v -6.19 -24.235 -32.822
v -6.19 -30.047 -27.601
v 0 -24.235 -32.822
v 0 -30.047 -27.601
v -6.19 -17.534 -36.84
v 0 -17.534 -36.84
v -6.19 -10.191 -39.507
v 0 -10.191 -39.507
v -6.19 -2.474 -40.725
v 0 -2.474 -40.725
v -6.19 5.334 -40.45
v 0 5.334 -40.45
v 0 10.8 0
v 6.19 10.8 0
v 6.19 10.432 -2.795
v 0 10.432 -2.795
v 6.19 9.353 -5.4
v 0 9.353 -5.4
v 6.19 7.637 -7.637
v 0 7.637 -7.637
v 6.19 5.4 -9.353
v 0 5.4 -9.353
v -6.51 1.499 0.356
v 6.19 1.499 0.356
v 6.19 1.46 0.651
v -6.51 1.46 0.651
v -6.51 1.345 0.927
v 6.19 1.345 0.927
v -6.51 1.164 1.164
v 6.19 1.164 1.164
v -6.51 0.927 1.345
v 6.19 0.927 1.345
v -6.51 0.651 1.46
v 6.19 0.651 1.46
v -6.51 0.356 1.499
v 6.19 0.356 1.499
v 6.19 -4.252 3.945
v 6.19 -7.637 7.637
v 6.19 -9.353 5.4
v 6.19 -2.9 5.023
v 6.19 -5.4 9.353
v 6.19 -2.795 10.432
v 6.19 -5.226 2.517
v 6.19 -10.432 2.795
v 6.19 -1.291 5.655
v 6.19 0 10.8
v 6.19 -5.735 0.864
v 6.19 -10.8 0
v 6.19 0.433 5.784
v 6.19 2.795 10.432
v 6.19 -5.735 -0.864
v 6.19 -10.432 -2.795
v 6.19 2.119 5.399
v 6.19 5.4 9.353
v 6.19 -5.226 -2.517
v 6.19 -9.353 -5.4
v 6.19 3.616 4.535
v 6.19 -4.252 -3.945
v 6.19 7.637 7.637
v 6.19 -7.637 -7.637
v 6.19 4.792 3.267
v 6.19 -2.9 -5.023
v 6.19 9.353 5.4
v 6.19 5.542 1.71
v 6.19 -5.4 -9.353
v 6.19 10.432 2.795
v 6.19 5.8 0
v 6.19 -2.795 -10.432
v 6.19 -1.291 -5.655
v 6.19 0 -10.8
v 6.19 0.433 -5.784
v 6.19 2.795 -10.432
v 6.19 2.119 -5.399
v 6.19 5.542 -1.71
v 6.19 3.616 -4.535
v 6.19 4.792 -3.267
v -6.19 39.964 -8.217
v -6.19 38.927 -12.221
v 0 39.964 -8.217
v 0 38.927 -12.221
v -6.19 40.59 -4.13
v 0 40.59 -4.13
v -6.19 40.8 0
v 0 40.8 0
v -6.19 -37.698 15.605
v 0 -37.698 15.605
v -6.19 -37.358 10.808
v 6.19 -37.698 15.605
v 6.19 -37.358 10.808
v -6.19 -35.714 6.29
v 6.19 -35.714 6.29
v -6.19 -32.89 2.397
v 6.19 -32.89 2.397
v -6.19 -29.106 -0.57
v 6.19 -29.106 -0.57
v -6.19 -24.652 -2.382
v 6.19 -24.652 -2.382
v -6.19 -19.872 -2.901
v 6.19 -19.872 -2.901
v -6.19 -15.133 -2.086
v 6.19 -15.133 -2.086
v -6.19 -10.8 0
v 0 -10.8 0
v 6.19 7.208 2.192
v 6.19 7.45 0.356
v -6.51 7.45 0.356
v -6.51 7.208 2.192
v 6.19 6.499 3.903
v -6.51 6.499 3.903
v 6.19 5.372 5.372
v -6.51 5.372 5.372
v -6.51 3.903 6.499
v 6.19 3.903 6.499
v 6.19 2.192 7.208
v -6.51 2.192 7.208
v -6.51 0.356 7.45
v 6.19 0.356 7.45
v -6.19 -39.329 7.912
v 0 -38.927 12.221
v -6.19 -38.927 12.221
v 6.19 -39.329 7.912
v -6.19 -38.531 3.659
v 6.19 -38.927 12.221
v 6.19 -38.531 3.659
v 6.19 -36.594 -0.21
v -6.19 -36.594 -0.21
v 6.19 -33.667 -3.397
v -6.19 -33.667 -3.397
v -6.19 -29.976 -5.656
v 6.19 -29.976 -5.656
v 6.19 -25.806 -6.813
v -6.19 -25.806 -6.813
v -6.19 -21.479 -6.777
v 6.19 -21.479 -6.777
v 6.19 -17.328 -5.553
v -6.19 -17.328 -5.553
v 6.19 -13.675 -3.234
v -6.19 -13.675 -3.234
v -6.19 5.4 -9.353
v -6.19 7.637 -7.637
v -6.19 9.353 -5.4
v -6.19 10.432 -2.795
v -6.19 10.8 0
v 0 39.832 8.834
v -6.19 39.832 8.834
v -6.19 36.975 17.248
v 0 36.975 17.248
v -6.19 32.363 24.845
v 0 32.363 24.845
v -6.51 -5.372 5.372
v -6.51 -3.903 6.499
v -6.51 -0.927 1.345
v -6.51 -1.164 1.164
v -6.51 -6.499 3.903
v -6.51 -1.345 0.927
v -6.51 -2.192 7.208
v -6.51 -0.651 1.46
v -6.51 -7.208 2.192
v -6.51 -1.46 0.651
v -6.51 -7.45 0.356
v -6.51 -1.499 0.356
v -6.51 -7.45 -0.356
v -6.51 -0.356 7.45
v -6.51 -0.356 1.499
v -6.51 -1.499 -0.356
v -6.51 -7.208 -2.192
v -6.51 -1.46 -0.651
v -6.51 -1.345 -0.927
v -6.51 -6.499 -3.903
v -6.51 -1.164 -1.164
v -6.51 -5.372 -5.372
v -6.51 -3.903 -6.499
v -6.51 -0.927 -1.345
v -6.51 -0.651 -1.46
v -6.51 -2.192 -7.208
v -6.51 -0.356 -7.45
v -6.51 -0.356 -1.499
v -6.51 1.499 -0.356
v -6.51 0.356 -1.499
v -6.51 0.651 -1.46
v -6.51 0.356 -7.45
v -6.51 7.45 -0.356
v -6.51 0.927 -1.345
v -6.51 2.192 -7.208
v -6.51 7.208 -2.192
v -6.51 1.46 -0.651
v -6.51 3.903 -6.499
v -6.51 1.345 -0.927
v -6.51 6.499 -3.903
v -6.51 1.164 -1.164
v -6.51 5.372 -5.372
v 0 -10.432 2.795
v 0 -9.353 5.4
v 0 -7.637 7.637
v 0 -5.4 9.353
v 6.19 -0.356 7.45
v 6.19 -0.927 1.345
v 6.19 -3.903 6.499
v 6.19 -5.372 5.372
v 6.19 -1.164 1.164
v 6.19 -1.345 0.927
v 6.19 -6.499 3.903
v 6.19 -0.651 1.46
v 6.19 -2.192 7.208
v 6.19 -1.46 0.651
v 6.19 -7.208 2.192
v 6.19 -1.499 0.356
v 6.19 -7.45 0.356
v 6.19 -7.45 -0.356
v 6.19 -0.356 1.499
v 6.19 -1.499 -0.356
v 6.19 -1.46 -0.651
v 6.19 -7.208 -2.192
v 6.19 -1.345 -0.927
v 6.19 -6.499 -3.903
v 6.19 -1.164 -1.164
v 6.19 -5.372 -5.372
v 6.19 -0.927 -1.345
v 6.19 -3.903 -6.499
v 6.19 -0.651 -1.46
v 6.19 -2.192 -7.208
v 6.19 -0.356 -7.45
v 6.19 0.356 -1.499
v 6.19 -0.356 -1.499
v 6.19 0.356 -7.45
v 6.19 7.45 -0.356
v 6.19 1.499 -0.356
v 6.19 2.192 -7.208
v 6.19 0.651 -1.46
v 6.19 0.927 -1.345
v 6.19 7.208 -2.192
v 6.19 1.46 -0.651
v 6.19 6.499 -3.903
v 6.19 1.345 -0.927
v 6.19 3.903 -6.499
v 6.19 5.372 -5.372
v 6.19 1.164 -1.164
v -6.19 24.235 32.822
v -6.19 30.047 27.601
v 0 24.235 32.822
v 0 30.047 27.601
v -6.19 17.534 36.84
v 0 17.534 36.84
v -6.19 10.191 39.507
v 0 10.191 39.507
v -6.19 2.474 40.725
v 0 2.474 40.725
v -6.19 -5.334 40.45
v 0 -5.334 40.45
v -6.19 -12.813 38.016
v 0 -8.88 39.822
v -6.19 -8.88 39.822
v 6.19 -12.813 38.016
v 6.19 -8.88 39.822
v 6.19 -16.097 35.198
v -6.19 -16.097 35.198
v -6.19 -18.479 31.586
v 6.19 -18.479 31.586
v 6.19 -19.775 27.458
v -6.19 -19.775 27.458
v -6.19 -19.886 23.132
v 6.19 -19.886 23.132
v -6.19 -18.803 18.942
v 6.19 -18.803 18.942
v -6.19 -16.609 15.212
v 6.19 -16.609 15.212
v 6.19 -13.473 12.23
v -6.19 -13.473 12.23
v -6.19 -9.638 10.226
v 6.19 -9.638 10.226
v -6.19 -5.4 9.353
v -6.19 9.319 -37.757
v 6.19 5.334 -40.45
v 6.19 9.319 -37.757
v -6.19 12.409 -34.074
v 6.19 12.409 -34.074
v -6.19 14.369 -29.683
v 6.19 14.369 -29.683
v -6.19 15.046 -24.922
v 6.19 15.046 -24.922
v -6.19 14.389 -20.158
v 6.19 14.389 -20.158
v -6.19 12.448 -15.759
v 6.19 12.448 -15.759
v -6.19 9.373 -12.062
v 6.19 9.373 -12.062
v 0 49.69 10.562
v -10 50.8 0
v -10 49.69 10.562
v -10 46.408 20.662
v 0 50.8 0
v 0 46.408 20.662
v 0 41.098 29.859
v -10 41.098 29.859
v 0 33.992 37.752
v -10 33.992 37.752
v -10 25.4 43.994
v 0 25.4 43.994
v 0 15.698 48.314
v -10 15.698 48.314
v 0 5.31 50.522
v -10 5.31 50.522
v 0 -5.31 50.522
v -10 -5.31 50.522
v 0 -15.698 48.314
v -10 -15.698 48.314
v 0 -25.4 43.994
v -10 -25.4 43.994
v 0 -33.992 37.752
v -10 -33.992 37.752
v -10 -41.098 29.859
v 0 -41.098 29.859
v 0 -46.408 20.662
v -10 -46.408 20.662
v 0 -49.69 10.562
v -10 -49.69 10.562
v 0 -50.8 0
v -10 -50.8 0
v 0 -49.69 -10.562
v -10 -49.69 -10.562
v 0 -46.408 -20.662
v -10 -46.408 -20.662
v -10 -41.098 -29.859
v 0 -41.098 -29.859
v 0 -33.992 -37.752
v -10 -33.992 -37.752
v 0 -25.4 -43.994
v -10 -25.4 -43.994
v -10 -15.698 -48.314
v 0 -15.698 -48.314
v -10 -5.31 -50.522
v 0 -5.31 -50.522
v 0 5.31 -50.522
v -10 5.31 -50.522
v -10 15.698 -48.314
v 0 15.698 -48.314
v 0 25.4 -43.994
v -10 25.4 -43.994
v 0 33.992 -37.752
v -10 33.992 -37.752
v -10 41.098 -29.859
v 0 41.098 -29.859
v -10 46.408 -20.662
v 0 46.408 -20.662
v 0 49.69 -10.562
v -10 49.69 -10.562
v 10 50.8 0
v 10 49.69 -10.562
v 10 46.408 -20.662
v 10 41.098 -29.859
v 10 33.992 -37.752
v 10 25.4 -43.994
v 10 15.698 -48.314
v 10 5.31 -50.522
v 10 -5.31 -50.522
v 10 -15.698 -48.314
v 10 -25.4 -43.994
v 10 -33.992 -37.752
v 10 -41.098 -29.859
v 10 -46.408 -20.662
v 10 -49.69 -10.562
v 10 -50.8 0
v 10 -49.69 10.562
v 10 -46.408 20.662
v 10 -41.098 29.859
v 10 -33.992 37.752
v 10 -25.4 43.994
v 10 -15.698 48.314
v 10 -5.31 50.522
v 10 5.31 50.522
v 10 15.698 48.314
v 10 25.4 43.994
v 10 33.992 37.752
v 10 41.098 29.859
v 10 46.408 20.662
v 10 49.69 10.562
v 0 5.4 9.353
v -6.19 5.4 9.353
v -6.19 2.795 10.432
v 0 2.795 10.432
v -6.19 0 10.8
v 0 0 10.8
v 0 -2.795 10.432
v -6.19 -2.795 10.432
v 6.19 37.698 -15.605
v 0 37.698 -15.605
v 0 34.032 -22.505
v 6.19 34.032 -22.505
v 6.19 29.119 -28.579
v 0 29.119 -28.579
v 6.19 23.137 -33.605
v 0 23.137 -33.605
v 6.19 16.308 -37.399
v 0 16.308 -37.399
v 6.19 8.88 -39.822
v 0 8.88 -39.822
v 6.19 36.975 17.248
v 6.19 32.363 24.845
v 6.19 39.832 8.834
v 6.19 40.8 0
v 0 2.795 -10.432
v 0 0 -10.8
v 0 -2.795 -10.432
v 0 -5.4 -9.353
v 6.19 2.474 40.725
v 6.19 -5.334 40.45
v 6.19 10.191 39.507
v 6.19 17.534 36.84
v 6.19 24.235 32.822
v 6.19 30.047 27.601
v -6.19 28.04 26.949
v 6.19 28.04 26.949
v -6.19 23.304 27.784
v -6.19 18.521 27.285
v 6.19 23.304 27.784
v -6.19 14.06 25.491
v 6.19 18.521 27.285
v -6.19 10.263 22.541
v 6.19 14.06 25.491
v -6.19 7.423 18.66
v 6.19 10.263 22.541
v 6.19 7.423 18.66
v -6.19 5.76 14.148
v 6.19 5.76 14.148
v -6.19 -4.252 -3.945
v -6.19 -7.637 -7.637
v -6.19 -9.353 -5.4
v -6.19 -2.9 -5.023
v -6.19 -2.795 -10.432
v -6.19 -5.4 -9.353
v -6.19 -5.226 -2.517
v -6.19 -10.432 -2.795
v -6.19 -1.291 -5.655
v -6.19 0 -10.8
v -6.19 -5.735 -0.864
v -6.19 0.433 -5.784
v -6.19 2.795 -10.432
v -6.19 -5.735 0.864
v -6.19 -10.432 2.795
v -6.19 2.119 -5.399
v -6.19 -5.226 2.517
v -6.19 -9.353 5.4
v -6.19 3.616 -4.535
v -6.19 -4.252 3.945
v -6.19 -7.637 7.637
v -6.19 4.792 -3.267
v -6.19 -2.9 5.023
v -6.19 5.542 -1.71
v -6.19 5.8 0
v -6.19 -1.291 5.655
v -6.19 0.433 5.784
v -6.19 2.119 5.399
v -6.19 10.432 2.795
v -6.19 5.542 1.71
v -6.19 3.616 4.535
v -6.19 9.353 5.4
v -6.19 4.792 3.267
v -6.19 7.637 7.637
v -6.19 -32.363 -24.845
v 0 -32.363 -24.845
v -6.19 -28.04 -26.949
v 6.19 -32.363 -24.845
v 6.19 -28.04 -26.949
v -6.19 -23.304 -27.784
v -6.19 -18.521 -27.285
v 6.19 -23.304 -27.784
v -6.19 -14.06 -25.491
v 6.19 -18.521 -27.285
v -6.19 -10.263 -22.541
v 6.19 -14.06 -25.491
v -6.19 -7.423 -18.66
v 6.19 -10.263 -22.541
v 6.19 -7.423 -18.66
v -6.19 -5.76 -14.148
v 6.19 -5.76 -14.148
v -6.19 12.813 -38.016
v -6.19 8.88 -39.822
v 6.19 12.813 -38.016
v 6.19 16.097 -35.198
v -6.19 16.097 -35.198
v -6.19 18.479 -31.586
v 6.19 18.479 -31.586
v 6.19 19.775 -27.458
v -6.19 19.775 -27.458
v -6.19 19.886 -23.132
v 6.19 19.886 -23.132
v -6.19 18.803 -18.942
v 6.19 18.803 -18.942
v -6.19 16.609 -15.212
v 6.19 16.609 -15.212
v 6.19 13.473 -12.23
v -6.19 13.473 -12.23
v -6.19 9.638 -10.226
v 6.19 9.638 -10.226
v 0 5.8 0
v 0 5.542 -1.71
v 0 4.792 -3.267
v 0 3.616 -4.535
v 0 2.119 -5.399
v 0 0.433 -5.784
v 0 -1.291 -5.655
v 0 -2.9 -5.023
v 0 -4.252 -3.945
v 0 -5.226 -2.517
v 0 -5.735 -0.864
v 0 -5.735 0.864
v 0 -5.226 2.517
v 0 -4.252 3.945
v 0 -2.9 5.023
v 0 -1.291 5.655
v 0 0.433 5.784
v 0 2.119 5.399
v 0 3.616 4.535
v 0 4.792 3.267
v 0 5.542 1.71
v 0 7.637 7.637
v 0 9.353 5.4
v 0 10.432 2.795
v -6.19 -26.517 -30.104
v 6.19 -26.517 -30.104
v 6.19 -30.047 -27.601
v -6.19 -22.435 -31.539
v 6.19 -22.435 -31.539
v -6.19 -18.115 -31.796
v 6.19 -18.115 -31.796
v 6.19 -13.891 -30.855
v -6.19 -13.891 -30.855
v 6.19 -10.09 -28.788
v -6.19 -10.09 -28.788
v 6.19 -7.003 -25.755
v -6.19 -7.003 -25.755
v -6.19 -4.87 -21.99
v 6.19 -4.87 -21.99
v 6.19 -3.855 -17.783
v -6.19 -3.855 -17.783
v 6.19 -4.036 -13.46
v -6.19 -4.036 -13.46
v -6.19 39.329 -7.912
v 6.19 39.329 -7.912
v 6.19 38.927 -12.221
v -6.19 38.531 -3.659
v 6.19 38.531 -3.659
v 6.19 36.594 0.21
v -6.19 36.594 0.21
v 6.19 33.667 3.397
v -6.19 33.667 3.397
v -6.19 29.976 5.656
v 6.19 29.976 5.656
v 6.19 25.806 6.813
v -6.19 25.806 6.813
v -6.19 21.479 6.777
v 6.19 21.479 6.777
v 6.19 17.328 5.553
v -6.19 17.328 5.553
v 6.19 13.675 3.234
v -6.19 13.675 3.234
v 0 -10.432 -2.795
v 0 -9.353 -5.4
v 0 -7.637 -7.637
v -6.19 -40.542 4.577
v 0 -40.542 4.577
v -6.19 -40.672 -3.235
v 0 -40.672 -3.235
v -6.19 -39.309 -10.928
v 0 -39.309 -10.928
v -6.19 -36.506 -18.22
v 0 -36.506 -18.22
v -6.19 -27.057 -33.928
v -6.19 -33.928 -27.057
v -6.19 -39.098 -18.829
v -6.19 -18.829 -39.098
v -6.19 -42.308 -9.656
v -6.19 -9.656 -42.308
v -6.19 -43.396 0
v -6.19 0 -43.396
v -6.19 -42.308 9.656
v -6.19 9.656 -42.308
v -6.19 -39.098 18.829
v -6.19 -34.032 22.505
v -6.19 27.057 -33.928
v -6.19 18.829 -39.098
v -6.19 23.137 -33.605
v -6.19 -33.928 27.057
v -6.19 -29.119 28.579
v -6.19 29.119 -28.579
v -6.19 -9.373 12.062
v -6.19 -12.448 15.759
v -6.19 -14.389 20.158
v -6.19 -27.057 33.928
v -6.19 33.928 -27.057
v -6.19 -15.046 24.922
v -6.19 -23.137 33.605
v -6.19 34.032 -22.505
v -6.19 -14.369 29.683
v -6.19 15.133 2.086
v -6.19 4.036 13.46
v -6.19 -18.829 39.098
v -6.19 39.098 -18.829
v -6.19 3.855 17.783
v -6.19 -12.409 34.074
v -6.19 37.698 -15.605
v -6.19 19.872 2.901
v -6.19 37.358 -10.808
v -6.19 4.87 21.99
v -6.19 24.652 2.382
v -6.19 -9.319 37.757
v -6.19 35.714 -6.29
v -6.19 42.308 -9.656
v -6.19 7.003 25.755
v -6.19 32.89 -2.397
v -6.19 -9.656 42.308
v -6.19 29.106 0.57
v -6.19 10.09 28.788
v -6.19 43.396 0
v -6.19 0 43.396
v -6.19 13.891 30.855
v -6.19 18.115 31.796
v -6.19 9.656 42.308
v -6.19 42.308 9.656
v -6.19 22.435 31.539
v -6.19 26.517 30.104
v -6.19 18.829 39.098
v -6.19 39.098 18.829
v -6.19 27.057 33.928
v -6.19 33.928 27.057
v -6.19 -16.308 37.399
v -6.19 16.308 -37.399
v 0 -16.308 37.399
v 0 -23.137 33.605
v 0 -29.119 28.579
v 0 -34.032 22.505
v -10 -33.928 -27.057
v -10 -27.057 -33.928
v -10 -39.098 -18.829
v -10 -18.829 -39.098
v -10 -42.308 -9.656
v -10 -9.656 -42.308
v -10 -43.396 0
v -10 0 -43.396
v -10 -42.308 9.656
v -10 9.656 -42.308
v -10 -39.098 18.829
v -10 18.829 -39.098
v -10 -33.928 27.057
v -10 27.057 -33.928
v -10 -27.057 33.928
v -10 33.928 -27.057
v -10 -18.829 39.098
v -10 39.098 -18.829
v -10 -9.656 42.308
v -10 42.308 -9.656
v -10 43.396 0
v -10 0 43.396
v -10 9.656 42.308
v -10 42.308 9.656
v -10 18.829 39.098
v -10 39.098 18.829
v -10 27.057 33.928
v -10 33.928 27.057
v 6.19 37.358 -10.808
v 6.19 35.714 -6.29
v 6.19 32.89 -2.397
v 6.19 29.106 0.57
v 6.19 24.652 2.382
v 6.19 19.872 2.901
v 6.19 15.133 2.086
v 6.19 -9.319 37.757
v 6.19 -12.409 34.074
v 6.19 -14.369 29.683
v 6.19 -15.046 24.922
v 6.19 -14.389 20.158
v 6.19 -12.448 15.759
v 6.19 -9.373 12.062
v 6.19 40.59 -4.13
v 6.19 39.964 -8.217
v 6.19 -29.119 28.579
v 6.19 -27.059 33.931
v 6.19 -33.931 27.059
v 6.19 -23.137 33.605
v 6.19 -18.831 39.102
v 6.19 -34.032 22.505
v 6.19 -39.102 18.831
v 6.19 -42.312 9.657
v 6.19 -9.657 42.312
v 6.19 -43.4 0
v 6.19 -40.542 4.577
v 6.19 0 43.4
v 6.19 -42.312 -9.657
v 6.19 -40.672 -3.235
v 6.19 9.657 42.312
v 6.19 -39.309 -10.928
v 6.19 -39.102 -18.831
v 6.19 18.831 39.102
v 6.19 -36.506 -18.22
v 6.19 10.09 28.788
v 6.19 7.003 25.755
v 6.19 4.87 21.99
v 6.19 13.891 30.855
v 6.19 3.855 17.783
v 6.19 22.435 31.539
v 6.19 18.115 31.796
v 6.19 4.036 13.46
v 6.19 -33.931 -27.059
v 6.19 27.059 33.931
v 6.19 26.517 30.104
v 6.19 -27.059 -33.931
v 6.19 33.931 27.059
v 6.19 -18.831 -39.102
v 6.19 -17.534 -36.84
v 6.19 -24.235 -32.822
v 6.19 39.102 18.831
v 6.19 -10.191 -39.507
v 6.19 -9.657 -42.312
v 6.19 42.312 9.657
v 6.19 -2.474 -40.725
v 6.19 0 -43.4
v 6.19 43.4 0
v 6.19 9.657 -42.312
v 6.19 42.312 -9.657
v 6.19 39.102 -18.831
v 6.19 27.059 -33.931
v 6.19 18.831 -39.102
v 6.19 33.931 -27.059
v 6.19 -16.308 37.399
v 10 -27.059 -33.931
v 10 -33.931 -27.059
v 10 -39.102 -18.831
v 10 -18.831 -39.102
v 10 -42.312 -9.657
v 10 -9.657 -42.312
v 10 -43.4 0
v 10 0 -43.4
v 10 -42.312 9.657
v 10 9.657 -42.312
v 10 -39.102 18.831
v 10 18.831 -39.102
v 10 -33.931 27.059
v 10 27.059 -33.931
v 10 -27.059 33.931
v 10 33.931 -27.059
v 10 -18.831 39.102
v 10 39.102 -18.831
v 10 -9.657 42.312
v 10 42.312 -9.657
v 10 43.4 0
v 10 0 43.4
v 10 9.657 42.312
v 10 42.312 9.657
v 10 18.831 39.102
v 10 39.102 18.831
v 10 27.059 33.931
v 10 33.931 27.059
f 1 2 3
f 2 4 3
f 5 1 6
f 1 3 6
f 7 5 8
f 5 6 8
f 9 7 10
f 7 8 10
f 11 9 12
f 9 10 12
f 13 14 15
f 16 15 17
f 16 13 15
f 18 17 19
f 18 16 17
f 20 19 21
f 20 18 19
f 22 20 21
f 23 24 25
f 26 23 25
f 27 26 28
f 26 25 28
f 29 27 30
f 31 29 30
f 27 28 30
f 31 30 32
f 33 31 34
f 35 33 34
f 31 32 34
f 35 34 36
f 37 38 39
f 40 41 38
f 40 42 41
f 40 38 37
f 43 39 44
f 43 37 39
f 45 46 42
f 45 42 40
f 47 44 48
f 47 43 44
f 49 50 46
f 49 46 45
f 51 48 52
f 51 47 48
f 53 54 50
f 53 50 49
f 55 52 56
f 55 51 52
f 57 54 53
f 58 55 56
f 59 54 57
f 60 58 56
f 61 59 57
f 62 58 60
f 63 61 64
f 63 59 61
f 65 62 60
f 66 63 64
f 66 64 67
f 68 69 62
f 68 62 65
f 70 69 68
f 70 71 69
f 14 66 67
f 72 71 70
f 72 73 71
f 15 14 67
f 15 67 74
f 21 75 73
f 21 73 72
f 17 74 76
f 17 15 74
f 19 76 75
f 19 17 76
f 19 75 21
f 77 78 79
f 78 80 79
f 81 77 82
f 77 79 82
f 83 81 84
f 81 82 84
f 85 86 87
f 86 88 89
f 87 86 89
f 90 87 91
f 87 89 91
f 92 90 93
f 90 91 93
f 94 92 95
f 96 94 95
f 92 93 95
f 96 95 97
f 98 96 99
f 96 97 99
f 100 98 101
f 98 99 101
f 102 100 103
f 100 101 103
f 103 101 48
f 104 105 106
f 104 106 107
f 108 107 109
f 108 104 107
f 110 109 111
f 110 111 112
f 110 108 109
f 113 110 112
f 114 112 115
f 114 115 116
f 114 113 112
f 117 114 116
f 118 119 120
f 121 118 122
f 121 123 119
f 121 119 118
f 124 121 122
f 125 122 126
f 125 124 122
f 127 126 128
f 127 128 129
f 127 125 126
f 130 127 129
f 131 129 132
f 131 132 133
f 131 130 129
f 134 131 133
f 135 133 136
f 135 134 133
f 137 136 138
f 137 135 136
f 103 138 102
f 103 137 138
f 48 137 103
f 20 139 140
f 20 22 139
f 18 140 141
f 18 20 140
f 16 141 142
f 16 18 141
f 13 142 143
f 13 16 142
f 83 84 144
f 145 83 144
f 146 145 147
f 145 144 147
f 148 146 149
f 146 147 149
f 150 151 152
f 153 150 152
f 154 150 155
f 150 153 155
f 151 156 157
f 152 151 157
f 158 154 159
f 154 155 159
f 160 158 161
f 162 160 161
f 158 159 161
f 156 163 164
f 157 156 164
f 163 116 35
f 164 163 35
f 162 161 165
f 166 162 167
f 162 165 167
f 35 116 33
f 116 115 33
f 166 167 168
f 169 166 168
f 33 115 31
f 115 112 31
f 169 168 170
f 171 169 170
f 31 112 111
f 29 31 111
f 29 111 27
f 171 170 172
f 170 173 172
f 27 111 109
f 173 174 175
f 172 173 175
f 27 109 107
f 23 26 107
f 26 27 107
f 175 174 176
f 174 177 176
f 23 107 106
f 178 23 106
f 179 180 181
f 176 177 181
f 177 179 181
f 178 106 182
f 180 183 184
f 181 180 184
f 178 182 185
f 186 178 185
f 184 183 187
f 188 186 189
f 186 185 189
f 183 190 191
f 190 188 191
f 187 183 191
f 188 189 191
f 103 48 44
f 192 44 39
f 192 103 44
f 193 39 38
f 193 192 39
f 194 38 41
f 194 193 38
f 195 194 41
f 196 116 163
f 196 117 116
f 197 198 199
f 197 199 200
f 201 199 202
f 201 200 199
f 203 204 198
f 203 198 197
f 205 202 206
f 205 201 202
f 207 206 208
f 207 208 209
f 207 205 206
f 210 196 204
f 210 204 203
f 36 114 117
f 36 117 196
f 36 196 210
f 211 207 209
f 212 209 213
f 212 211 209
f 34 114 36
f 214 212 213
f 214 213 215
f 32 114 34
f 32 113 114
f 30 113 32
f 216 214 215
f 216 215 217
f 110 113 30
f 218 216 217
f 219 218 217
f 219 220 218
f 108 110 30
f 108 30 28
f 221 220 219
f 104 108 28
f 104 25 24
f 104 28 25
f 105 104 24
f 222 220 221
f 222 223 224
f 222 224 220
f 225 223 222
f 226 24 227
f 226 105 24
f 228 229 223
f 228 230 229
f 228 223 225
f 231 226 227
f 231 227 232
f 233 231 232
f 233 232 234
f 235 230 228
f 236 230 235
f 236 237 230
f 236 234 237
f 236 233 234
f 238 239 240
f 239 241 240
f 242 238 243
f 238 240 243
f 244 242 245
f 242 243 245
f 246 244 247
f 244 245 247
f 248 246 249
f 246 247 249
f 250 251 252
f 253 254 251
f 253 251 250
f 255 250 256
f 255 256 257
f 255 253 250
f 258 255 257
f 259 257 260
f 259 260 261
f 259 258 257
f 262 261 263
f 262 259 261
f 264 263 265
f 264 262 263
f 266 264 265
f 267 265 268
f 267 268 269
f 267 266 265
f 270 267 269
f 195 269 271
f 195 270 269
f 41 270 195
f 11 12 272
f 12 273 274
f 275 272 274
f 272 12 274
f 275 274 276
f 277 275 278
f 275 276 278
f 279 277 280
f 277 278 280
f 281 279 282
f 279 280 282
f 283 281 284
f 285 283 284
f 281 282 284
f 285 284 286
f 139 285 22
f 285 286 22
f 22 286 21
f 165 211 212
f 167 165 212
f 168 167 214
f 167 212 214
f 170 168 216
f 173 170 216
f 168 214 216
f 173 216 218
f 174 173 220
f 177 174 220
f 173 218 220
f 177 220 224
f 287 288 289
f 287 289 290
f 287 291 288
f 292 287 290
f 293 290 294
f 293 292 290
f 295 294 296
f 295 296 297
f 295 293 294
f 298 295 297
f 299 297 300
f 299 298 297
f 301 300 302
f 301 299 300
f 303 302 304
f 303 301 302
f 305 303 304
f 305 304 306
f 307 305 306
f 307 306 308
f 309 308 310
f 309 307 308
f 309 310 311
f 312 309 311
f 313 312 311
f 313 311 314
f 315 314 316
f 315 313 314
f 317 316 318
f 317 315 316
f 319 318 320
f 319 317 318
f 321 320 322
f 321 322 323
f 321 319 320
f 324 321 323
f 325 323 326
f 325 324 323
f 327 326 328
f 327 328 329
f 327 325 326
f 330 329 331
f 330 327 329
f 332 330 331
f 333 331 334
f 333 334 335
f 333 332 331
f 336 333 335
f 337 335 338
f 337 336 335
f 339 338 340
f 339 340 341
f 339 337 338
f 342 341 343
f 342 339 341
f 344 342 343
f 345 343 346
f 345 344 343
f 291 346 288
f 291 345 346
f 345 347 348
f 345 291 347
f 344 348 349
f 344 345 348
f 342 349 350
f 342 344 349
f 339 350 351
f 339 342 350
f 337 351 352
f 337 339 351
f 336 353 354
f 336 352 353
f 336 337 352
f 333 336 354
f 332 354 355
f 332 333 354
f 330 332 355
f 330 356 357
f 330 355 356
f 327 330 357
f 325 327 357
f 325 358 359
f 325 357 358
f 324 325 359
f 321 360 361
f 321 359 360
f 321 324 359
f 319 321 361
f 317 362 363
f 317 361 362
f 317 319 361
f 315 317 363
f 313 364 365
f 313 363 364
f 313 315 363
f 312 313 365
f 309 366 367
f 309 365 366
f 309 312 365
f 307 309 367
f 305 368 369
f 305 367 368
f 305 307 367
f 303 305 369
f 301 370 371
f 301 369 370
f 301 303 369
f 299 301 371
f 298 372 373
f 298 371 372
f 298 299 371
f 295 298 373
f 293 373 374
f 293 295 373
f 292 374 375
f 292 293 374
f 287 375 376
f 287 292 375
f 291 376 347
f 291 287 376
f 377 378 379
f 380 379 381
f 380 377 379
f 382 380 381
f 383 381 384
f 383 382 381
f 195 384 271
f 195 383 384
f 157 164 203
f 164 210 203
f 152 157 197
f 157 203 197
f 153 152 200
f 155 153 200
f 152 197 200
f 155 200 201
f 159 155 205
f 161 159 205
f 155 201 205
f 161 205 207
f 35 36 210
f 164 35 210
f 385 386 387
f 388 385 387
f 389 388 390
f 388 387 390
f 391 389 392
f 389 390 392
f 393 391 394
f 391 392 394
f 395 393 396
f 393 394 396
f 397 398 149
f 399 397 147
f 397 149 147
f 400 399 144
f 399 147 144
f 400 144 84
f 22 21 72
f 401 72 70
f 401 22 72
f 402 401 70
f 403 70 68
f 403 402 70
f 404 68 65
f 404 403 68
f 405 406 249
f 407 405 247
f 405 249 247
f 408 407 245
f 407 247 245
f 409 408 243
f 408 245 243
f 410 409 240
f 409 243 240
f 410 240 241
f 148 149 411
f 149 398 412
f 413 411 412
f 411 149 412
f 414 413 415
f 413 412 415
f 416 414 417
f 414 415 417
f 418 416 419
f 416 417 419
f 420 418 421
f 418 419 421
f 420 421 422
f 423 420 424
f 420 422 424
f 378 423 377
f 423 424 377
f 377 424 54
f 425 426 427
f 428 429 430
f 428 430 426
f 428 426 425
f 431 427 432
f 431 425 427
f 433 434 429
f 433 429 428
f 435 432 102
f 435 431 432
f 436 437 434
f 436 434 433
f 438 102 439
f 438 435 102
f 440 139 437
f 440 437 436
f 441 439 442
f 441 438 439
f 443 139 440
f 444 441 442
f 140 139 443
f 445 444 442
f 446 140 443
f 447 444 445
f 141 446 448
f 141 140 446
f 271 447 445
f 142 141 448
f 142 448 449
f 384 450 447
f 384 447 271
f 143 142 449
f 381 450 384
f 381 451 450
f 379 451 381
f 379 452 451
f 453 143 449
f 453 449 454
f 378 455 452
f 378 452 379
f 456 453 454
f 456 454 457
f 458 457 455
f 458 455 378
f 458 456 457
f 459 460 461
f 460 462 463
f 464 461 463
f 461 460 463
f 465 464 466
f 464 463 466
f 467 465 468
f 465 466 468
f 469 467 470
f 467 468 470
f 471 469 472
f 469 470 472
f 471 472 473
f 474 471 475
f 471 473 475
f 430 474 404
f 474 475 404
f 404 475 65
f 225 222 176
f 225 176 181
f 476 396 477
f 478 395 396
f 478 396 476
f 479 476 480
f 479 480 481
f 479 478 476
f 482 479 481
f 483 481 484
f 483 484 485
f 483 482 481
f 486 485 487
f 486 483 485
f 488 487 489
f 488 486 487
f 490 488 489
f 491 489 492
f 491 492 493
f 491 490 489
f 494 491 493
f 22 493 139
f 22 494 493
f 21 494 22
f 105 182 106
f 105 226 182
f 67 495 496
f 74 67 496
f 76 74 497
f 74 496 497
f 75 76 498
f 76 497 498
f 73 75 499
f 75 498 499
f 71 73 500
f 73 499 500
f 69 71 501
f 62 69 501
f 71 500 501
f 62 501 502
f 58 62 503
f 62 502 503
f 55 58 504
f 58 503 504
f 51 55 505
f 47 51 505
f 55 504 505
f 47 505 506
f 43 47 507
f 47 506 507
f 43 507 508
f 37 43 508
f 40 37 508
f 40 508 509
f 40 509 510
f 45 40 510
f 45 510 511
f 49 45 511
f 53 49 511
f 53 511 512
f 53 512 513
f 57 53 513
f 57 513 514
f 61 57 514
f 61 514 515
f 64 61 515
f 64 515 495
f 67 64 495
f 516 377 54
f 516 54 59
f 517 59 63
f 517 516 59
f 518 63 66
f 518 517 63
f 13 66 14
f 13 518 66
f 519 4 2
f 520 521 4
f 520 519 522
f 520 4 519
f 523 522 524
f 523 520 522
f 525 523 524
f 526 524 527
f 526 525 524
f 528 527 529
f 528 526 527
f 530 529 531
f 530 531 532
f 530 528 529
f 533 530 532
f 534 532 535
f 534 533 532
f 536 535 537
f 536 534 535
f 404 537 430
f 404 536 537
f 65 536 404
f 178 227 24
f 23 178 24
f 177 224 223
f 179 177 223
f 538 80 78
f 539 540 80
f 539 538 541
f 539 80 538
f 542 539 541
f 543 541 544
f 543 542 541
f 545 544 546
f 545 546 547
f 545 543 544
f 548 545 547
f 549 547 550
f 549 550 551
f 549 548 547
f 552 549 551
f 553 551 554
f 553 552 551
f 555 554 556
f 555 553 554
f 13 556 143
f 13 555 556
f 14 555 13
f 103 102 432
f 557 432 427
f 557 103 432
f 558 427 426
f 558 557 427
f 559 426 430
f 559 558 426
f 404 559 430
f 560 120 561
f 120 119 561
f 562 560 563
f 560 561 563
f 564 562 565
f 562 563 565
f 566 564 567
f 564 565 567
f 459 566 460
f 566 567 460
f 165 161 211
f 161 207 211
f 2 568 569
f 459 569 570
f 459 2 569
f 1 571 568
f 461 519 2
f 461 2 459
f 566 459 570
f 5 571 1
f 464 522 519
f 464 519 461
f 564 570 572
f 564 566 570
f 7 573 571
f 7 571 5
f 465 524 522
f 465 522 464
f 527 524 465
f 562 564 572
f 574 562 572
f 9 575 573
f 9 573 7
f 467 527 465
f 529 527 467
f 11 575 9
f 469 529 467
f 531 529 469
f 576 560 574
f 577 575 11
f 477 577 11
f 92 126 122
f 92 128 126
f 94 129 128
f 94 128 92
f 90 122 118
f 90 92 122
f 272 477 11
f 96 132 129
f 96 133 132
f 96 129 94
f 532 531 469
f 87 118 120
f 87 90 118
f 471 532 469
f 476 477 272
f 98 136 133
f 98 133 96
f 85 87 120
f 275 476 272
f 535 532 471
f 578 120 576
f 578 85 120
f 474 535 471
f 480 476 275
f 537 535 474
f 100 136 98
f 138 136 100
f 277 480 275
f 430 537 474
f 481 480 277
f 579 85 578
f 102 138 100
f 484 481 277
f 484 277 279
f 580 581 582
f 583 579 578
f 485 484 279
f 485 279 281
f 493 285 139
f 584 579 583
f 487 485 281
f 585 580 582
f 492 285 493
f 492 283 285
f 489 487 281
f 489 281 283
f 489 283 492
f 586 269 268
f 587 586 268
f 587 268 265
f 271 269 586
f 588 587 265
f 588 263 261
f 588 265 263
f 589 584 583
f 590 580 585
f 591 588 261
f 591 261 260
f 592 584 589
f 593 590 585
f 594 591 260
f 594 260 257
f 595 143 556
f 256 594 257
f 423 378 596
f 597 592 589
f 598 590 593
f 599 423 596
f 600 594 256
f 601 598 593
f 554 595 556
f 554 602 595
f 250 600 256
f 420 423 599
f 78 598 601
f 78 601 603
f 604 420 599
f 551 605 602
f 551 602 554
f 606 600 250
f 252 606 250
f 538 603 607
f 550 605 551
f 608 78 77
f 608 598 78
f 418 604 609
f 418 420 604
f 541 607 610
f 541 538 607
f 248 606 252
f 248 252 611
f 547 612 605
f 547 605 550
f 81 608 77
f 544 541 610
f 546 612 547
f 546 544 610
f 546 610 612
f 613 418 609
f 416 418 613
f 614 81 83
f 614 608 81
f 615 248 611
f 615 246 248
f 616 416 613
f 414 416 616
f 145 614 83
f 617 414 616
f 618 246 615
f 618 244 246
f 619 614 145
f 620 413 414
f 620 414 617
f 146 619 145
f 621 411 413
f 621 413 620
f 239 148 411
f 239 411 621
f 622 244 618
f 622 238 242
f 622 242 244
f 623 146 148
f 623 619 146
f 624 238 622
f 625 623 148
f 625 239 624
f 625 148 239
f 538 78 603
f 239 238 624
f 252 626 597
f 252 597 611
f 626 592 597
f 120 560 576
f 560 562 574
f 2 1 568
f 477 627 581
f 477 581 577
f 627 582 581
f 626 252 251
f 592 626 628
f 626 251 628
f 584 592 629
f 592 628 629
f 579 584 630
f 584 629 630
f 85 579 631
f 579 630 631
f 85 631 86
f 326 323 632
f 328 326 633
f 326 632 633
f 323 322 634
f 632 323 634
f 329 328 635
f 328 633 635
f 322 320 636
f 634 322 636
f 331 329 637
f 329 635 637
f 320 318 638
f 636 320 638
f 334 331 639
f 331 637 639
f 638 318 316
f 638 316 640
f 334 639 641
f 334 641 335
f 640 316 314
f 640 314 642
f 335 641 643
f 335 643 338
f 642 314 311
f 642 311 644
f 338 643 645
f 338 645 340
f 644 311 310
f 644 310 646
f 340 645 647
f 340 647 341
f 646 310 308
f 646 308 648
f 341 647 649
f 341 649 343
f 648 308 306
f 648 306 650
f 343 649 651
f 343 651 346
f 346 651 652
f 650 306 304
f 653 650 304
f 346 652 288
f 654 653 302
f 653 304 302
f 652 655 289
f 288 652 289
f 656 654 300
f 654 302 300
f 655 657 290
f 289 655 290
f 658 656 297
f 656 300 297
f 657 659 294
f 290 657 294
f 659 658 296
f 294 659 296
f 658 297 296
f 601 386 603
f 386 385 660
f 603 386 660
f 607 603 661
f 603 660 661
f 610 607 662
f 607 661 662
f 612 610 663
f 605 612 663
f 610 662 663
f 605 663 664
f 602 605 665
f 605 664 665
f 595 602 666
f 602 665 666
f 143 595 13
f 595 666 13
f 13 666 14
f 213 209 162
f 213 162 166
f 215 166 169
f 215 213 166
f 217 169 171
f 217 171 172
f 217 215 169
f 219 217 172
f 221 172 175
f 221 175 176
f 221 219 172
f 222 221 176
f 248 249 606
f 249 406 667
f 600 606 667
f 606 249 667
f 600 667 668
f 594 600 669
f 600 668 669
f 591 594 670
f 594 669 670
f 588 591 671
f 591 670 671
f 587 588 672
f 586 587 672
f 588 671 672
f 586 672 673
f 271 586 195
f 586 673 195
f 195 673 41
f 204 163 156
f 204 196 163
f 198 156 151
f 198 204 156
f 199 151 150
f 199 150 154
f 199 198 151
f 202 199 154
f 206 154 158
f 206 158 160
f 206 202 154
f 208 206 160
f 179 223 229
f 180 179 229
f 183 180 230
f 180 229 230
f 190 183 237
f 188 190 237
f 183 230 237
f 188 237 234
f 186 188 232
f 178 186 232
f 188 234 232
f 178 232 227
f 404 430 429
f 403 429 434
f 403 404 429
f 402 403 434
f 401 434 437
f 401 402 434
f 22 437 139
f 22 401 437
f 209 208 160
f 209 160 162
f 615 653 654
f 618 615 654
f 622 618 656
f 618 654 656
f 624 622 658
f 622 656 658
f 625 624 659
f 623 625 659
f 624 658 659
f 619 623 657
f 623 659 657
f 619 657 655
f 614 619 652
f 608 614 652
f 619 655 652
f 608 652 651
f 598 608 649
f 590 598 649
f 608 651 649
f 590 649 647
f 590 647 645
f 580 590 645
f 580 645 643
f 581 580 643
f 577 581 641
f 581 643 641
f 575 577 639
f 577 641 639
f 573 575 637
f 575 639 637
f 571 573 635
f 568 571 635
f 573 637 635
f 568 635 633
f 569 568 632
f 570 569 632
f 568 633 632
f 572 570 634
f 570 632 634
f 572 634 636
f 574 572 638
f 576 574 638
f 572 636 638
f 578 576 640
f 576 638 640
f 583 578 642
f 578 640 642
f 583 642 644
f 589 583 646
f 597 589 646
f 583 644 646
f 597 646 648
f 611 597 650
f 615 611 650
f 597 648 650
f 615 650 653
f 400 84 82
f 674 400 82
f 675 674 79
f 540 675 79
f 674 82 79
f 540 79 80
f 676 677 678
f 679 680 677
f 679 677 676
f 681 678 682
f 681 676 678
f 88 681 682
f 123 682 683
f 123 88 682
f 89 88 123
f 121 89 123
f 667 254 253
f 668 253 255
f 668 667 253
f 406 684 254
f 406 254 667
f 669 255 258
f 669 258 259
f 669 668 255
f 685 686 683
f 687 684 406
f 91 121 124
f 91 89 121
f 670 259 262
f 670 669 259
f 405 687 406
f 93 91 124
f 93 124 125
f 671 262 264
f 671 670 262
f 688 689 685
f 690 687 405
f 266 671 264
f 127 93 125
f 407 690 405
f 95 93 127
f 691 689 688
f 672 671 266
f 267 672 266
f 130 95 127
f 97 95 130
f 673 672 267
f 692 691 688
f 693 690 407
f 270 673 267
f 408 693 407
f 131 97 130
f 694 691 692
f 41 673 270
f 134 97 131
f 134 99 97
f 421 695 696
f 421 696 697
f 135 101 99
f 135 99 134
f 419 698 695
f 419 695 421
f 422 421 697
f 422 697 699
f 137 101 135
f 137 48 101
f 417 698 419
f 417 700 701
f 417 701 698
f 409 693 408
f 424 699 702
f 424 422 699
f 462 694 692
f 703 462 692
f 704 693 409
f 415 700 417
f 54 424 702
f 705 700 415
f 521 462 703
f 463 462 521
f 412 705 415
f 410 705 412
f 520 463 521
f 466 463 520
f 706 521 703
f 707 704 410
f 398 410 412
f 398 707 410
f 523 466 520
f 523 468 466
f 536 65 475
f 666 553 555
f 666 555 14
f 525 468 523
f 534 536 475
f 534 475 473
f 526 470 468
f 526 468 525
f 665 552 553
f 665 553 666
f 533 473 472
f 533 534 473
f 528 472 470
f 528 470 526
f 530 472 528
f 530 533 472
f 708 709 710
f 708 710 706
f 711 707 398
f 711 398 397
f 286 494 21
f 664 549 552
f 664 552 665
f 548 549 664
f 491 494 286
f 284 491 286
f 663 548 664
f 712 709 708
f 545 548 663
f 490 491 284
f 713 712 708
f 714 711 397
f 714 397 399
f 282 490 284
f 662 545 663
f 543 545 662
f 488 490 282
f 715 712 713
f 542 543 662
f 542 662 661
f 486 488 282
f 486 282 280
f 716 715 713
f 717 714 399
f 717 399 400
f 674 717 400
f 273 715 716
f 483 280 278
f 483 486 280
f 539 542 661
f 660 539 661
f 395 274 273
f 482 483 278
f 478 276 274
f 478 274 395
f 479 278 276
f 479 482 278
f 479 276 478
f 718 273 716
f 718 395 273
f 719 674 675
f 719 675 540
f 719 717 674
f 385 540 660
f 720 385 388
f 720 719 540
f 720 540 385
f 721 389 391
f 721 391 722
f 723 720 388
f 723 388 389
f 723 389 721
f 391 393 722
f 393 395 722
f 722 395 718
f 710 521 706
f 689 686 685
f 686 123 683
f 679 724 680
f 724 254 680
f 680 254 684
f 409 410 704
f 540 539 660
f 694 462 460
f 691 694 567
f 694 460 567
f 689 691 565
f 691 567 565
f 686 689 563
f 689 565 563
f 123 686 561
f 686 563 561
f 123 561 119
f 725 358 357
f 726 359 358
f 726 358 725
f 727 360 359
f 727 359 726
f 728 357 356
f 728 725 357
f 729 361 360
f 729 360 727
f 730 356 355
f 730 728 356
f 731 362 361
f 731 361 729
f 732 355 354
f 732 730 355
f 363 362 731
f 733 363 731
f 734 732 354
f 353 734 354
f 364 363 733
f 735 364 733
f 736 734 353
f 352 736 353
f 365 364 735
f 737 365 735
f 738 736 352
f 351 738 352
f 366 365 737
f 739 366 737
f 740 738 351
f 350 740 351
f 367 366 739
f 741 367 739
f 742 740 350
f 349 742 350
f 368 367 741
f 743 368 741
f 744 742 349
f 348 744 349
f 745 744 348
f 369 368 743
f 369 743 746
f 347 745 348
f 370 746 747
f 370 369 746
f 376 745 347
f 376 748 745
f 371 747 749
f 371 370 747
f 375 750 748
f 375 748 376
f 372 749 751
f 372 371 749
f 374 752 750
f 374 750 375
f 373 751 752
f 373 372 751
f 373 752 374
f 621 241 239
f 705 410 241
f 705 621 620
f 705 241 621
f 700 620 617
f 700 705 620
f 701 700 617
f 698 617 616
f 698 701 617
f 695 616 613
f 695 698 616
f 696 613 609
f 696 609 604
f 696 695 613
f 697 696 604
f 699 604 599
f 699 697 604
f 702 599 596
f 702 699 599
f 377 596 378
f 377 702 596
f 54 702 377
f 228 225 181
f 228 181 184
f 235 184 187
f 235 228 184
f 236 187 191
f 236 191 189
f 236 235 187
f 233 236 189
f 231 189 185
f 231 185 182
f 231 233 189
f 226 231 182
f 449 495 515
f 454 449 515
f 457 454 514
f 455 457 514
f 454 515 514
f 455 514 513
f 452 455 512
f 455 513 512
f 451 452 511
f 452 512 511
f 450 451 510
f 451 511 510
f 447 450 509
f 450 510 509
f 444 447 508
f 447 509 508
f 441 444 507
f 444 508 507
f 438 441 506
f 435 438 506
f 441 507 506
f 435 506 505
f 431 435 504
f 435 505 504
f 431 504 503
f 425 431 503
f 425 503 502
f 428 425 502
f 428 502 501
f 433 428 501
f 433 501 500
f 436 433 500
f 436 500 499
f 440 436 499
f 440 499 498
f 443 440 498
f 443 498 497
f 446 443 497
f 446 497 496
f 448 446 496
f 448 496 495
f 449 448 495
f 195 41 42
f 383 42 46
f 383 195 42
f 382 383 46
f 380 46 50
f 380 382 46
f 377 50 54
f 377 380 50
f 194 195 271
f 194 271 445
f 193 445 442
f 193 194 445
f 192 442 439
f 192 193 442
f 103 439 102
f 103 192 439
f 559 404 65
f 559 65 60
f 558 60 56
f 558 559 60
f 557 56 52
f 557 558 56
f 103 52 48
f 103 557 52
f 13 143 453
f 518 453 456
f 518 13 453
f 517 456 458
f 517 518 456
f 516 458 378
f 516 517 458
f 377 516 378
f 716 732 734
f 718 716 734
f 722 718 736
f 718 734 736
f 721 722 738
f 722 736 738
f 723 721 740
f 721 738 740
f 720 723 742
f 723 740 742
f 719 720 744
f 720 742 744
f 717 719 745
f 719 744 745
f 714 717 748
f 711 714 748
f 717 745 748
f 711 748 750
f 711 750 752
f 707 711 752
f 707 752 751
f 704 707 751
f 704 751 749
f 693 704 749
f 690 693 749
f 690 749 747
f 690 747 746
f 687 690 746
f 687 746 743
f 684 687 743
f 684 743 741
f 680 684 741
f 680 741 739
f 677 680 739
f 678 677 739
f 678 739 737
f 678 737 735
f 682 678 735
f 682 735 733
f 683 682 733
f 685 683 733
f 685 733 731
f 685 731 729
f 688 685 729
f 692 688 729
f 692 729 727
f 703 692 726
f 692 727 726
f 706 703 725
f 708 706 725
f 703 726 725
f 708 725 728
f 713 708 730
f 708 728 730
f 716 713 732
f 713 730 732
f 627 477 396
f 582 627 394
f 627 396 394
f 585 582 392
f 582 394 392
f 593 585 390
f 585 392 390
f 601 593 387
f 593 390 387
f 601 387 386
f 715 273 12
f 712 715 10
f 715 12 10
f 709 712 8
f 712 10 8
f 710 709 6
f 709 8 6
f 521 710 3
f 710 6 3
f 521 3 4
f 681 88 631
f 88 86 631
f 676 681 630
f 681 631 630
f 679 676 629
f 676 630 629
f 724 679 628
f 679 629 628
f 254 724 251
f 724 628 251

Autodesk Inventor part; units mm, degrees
ref_plane "YZ Plane" through (0, 0, 0) normal (1, 0, 0) x (0, 1, 0)
ref_plane "XZ Plane" through (0, 0, 0) normal (0, 1, 0) x (-1, 0, 0)
ref_plane "XY Plane" through (0, 0, 0) normal (0, 0, 1) x (1, 0, 0)
sketch "Sketch1" plane through (0, 0, 0) normal (1, 0, 0) x (0, 1, 0)
  circle A0 centre (0, 0) radius 50.8
  circle A1 centre (0, 0) radius 40.8
  circle A2 centre (0, 0) radius 10.8
  circle A3 centre (0, 0) radius 5.8
  dimension "d0" = 101.6
  dimension "d1" = 10
  dimension "d2" = 30
  dimension "d3" = 5
extrude "Extrusion1" add sketch "Sketch1" along normal mid plane 20
sketch "Sketch2" plane through (10, 0, 0) normal (1, 0, 0) x (0, 0, -1)
  circle A0 centre (0, 0) radius 40.8 projected
  circle A1 centre (0, 0) radius 10.8 projected
  arc A2 (15.6051, 37.6978) -> (0, 10.8) centre (8.6314, 23.768) ccw
  arc A3 (15.6051, 37.6978) -> (0, 10.8) centre (14.4186, 20.4105) ccw
  arc A4 (40.4498, 5.3344) -> (9.3531, 5.4) centre (24.8994, 4.409) ccw
  arc A5 (40.4498, 5.3344) -> (9.3531, 5.4) centre (24.8853, -2.2817) ccw
  arc A6 (24.8447, -32.3633) -> (9.3531, -5.4) centre (16.268, -19.359) ccw
  arc A7 (24.8447, -32.3633) -> (9.3531, -5.4) centre (10.4667, -22.6921) ccw
  arc A8 (-15.6051, -37.6978) -> (0, -10.8) centre (-8.6314, -23.768) ccw
  arc A9 (-15.6051, -37.6978) -> (0, -10.8) centre (-14.4186, -20.4105) ccw
  arc A10 (-40.4498, -5.3344) -> (-9.3531, -5.4) centre (-24.8994, -4.409) ccw
  arc A11 (-40.4498, -5.3344) -> (-9.3531, -5.4) centre (-24.8853, 2.2817) ccw
  arc A12 (-24.8447, 32.3633) -> (-9.3531, 5.4) centre (-16.268, 19.359) ccw
  arc A13 (-24.8447, 32.3633) -> (-9.3531, 5.4) centre (-10.4667, 22.6921) ccw
  dimension "d8" = 360
extrude "Extrusion2" add sketch "Sketch2" against normal blind 20 contours A5 A4 A0 | A0 A4 | A6 A0 | A0 A7 A6 | A3 A2 A0 | A0 A2 | A8 A0 | A0 A9 A8 | A12 A0 A13 | A10 A0 A11 | A0 A12 | A10 A0
sketch "Sketch3" plane through (10, 0, 0) normal (1, 0, 0) x (0, 0, -1)
  circle A0 centre (0, 0) radius 43.4
  dimension "d12" = 86.8
extrude "Extrusion3" cut sketch "Sketch3" against normal blind 3.81
sketch "Sketch4" plane through (-10, 0, 0) normal (-1, 0, 0) x (0, 0, 1)
  circle A0 centre (0, 0) radius 43.3959
  dimension "d15" = 86.7918
extrude "Extrusion4" cut sketch "Sketch4" against normal blind 3.81
sketch "Sketch5" plane through (6.19, 0, 0) normal (1, 0, 0) x (0, 0, -1)
  line L0 (0.3556, 1.4986) -> (-0.3556, 1.4986)
  line L1 (-1.4986, 0.3556) -> (-1.4986, -0.3556)
  line L2 (-0.3556, -1.4986) -> (0.3556, -1.4986)
  line L3 (1.4986, -0.3556) -> (1.4986, 0.3556)
  arc A0 (-0.3556, 1.4986) -> (-1.4986, 0.3556) centre (-0.3556, 0.3556) ccw
  arc A1 (1.4986, 0.3556) -> (0.3556, 1.4986) centre (0.3556, 0.3556) ccw
  arc A2 (0.3556, -1.4986) -> (1.4986, -0.3556) centre (0.3556, -0.3556) ccw
  arc A3 (-1.4986, -0.3556) -> (-0.3556, -1.4986) centre (-0.3556, -0.3556) ccw
  line L4 (0.3556, 7.4499) -> (-0.3556, 7.4499)
  arc A4 (-0.3556, 7.4499) -> (-7.4499, 0.3556) centre (-0.3556, 0.3556) ccw
  line L5 (-7.4499, 0.3556) -> (-7.4499, -0.3556)
  arc A5 (-7.4499, -0.3556) -> (-0.3556, -7.4499) centre (-0.3556, -0.3556) ccw
  line L6 (-0.3556, -7.4499) -> (0.3556, -7.4499)
  arc A6 (0.3556, -7.4499) -> (7.4499, -0.3556) centre (0.3556, -0.3556) ccw
  line L7 (7.4499, -0.3556) -> (7.4499, 0.3556)
  arc A7 (7.4499, 0.3556) -> (0.3556, 7.4499) centre (0.3556, 0.3556) ccw
  point P0 (0, 0)
  point P1 (-1.4986, -1.4986)
  point P2 (-1.4986, 1.4986)
  point P3 (1.4986, -1.4986)
  dimension "d18" = 2.9972
  dimension "d19" = 2.9972
  dimension "d20" = 1.143
extrude "Extrusion5" add sketch "Sketch5" against normal blind 12.7 separate body
properties part number "Wheel"
